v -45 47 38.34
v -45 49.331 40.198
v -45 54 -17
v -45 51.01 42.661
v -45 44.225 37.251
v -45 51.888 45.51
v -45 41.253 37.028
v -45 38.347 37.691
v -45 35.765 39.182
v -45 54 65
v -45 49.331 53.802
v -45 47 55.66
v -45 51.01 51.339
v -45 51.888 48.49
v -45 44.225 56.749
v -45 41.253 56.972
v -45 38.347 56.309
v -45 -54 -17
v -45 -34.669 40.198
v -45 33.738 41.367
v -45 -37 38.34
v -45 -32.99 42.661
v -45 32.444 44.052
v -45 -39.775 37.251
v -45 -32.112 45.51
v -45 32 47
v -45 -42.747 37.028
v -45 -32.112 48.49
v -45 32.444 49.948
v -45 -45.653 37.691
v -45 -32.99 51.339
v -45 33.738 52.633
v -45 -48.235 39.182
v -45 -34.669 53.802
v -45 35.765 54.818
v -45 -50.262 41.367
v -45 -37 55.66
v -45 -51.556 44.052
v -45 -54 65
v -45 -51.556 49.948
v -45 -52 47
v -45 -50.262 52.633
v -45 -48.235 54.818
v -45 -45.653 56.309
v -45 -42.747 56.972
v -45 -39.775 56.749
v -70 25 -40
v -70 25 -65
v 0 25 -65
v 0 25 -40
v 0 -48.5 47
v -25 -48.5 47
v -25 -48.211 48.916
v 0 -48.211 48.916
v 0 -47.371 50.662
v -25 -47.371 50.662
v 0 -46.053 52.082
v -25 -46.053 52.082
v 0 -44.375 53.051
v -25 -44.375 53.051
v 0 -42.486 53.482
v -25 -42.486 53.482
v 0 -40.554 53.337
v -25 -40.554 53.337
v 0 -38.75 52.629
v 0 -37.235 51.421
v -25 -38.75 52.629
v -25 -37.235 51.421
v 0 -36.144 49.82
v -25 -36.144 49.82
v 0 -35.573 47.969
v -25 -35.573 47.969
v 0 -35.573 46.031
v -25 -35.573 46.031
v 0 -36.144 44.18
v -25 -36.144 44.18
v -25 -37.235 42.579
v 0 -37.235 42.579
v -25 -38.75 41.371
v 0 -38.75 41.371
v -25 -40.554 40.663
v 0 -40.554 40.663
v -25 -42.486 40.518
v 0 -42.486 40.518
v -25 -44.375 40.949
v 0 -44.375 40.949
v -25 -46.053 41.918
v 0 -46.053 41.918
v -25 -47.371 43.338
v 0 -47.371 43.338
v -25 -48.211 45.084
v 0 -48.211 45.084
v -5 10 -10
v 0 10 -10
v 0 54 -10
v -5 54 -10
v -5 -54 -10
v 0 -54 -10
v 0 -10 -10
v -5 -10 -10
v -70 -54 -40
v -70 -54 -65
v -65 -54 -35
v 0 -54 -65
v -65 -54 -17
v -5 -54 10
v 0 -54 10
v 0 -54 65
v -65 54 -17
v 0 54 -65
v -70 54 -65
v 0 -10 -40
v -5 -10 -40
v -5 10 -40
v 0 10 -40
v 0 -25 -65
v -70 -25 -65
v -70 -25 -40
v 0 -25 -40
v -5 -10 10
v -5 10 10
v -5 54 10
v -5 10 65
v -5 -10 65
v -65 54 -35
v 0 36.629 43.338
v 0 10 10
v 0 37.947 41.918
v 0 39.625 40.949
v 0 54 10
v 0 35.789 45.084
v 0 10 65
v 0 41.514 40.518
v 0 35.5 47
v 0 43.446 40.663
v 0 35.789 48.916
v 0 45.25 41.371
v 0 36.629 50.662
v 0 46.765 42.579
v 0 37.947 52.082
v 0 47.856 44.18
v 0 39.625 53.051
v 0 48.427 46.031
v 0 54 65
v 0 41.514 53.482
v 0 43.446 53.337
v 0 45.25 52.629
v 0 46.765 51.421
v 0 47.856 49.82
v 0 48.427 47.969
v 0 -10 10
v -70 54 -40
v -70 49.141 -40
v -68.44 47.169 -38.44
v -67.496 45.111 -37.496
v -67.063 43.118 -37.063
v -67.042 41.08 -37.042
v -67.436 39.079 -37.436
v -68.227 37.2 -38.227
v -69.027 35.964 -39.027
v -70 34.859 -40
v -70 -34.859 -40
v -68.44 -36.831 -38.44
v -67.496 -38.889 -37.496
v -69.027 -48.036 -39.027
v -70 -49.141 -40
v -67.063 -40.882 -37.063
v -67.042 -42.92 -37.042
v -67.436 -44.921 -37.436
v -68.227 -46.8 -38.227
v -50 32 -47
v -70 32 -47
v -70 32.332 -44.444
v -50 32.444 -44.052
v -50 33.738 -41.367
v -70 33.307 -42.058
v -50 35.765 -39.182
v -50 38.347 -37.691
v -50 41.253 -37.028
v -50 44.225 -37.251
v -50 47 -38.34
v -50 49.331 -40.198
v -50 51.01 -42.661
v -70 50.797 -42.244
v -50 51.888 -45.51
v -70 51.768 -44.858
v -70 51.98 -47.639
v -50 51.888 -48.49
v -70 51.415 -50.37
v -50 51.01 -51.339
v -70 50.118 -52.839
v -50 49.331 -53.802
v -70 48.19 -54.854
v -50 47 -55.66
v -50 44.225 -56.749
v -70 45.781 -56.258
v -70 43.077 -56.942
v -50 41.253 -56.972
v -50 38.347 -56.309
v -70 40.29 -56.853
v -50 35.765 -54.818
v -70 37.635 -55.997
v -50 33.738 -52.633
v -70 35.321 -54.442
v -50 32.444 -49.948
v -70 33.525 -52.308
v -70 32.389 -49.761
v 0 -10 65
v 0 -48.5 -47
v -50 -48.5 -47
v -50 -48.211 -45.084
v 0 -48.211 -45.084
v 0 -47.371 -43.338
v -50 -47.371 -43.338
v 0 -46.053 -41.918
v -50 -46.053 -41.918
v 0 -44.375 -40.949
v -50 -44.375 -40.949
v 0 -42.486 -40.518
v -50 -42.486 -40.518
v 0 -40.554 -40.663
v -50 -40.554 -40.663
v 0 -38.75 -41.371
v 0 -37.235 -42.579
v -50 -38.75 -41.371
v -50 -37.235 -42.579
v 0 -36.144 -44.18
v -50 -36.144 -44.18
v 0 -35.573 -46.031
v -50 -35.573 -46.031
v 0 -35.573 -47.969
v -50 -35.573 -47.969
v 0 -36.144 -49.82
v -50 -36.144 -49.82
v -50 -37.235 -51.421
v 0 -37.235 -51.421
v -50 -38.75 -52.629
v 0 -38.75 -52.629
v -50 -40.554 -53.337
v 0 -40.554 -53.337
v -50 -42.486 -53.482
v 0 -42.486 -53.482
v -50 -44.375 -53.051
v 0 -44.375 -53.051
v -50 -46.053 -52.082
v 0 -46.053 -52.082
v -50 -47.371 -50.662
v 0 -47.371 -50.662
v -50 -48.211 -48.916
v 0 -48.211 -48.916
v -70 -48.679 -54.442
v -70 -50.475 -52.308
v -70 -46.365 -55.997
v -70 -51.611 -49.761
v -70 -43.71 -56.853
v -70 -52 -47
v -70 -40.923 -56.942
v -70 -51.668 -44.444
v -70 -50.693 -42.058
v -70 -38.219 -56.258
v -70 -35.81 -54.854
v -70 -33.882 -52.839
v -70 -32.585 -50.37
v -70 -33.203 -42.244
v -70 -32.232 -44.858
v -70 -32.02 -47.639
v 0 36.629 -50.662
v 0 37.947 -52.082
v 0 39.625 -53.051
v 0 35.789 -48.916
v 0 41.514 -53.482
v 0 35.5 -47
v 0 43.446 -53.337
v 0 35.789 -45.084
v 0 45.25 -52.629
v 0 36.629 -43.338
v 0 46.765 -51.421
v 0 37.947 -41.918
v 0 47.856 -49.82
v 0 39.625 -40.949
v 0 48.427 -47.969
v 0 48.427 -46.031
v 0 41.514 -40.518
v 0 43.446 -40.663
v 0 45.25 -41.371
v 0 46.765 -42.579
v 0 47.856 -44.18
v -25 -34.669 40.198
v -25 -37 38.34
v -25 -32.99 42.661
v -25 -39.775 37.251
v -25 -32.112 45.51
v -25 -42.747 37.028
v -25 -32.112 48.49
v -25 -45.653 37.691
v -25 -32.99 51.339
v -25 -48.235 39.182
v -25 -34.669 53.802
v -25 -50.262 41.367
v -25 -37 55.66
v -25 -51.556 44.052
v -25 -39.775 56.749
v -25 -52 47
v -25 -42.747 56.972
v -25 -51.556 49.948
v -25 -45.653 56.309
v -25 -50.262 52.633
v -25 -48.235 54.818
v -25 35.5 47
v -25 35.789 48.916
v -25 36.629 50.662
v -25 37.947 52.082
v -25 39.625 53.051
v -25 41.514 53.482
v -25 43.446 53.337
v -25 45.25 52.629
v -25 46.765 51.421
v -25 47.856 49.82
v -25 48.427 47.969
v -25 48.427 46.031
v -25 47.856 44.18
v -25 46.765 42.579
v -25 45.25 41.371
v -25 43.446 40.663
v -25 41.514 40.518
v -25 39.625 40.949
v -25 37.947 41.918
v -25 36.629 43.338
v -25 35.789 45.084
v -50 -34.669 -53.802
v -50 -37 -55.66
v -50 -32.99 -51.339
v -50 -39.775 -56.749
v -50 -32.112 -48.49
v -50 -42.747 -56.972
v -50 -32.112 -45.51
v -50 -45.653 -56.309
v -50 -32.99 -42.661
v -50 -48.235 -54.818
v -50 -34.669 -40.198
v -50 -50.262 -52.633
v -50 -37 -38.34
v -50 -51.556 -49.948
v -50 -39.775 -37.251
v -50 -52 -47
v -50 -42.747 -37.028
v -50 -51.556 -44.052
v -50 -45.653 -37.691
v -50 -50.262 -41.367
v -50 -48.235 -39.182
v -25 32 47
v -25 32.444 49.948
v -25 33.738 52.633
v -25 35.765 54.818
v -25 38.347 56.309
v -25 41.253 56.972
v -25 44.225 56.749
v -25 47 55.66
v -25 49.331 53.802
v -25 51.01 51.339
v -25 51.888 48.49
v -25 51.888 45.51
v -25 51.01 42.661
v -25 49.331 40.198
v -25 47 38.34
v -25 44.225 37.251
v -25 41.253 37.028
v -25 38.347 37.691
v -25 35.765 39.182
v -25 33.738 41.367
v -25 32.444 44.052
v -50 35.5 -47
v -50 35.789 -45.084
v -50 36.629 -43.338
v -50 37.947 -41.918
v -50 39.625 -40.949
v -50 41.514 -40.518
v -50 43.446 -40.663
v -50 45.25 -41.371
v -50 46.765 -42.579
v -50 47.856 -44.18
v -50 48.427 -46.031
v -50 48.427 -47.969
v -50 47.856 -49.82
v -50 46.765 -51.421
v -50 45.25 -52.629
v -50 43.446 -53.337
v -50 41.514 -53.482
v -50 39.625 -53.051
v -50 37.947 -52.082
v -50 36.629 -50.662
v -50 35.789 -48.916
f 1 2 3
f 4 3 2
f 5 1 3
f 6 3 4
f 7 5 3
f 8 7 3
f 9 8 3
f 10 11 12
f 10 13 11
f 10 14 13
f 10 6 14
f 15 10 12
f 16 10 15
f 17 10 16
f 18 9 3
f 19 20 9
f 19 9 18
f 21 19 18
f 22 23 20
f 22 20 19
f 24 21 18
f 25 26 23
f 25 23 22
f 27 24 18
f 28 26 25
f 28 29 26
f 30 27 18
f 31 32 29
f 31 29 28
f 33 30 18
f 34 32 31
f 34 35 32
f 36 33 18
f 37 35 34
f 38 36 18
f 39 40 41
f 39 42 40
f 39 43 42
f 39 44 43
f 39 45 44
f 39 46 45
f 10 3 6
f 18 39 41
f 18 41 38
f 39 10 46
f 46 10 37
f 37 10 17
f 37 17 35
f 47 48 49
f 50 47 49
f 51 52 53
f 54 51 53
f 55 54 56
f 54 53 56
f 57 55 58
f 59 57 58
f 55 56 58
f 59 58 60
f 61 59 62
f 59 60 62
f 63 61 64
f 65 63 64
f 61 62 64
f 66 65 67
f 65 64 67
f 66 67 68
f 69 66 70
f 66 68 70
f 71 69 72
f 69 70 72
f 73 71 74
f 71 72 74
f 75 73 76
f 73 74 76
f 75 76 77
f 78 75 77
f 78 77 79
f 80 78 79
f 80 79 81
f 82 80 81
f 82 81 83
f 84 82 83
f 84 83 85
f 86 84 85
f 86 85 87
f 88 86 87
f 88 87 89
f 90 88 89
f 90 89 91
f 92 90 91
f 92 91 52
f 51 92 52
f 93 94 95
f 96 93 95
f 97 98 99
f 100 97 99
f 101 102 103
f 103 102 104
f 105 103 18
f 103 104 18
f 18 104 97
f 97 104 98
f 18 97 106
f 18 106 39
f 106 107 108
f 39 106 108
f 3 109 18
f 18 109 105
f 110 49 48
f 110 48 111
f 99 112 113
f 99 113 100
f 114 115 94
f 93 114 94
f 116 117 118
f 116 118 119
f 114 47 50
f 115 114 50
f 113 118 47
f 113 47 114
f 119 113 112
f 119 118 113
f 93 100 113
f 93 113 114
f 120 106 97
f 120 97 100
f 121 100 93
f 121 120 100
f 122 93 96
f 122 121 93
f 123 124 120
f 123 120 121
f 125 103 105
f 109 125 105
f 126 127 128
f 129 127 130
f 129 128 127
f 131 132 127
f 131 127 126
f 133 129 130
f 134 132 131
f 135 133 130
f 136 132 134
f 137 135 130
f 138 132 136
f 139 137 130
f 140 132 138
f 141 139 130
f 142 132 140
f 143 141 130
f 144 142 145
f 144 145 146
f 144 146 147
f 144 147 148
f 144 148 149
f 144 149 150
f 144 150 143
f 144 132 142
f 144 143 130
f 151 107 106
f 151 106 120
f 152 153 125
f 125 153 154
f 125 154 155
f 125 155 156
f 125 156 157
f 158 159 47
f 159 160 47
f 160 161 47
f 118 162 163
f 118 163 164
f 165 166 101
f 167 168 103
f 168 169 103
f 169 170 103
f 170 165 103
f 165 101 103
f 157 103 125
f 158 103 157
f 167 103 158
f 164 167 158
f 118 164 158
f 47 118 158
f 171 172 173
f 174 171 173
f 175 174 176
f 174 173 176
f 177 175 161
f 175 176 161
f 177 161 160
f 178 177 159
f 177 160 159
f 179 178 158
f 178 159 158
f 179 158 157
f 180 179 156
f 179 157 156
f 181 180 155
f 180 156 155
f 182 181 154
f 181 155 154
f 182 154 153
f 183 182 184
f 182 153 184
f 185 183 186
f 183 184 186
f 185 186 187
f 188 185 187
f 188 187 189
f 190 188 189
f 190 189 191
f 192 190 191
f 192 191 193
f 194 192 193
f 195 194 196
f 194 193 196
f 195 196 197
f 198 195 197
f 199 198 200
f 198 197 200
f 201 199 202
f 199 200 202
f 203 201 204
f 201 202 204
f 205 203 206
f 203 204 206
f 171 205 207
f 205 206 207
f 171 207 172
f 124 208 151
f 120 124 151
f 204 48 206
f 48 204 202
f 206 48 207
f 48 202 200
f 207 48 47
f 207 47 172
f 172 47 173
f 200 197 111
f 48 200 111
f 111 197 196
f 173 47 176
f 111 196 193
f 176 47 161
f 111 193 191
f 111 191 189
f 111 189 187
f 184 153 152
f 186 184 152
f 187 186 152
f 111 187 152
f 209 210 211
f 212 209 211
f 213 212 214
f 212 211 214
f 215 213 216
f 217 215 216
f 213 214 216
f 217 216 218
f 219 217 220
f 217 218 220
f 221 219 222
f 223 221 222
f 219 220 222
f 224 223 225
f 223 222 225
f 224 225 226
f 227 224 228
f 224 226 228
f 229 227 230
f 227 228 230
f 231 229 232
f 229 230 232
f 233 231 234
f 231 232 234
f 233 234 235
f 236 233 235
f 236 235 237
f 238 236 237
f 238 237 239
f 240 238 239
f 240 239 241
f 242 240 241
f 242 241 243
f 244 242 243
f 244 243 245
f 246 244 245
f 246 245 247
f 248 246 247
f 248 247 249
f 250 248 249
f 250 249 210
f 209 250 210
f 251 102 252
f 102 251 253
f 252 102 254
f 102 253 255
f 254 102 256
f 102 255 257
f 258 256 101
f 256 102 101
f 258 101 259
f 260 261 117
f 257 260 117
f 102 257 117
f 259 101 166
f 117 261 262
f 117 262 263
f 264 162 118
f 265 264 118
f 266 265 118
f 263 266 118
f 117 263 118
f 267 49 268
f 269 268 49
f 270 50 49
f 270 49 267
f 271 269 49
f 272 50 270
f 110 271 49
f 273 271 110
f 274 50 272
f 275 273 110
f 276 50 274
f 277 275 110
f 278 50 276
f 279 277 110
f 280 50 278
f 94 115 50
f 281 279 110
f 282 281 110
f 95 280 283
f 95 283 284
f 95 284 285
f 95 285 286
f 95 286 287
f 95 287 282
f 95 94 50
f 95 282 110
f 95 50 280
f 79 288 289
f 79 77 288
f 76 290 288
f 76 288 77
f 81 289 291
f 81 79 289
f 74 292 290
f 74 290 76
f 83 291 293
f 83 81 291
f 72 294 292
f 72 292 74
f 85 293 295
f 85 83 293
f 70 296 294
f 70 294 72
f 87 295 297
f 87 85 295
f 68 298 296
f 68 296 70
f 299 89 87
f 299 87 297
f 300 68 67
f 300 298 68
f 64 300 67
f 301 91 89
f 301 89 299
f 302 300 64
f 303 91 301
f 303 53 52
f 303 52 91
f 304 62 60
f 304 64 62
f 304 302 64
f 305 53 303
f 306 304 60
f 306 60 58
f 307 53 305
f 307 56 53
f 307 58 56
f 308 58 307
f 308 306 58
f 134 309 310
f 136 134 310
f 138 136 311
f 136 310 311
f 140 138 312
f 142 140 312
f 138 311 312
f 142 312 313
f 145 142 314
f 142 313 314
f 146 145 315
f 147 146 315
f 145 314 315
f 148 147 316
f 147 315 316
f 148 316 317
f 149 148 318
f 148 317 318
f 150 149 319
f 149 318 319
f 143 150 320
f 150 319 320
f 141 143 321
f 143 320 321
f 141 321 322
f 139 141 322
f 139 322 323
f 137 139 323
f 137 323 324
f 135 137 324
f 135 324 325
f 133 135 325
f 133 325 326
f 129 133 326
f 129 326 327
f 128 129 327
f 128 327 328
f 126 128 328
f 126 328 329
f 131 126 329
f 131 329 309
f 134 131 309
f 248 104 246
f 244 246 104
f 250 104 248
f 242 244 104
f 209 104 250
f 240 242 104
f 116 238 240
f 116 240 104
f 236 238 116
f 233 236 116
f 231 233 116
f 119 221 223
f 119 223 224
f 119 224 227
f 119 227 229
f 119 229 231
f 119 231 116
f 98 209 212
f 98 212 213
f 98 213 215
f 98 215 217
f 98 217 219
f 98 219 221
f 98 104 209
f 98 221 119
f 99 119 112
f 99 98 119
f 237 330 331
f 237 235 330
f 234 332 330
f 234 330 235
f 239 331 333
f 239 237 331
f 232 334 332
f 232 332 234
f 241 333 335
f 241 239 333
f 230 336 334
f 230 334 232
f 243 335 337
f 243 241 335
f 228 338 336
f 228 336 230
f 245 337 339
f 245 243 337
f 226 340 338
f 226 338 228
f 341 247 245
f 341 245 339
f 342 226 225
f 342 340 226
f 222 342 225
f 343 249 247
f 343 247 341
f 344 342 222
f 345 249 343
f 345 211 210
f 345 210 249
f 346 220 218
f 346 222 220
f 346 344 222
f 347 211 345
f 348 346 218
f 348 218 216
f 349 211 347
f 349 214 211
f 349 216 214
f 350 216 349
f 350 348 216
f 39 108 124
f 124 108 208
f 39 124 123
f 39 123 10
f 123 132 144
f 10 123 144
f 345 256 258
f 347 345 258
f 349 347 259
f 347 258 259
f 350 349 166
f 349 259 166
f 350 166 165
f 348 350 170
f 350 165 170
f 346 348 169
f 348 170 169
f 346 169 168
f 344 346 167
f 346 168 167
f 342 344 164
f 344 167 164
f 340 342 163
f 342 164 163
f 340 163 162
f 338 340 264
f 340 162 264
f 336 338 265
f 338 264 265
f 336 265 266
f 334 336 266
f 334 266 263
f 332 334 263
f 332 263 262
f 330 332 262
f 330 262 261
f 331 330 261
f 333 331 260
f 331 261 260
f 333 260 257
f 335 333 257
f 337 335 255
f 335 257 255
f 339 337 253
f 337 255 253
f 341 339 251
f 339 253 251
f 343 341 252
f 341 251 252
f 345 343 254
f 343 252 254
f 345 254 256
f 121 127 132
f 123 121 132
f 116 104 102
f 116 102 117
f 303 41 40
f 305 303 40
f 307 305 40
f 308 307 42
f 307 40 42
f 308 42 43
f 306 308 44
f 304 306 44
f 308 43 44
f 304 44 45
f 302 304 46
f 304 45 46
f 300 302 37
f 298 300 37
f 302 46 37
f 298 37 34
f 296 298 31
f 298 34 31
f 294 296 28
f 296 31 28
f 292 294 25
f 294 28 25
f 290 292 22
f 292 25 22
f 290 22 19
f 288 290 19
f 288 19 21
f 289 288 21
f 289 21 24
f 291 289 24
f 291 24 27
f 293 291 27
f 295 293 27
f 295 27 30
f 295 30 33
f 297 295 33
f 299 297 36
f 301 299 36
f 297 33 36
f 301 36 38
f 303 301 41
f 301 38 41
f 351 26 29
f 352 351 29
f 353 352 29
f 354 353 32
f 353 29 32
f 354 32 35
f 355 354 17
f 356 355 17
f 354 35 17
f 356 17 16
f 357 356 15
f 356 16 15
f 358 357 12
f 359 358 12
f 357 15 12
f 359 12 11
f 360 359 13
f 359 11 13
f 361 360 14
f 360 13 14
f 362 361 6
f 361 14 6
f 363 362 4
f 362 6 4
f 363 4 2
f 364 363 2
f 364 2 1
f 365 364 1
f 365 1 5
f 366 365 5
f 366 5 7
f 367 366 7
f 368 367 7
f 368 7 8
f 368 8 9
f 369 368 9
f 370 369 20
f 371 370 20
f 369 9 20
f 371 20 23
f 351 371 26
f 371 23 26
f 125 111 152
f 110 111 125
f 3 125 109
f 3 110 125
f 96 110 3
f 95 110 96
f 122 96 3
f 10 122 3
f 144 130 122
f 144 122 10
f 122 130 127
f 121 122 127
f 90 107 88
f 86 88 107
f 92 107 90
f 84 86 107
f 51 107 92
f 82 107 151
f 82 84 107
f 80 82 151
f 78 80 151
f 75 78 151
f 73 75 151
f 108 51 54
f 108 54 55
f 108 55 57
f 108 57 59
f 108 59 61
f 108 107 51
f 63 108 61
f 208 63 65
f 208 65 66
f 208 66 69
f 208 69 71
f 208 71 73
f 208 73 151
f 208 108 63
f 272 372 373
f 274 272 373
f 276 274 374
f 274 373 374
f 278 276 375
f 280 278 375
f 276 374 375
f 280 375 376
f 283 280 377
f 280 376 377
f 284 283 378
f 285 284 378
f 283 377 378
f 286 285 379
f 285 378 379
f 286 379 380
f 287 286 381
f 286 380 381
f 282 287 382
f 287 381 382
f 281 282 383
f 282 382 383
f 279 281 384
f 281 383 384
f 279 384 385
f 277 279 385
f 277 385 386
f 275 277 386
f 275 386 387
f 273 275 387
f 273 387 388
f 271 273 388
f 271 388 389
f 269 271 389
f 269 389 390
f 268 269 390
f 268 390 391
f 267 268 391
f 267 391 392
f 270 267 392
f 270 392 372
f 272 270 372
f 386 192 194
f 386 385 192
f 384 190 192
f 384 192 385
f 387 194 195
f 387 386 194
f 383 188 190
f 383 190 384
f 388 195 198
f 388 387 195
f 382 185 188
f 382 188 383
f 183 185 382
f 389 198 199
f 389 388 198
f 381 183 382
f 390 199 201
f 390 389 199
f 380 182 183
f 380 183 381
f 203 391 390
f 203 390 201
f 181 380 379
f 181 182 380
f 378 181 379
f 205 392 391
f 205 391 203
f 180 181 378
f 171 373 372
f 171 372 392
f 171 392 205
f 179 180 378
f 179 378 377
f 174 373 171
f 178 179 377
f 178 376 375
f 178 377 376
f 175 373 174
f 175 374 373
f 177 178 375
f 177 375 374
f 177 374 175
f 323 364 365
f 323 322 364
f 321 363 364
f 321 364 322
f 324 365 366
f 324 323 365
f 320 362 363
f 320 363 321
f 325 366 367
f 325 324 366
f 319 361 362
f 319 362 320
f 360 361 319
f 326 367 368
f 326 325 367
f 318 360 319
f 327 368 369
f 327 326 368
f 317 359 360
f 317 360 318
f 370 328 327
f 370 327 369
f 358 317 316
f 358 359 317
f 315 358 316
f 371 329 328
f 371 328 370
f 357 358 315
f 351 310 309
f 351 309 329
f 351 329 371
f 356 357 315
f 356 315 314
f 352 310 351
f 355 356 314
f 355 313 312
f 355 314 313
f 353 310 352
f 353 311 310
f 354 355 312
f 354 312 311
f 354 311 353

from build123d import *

# Parameters (mm, degrees)
F0_W      = 108
F0_H      = 130
F1_DEPTH  = 70
F2_R      = 6.5
F3_DEPTH  = 70.001
F4_W      = 70
F4_H      = 50
F5_DEPTH  = 25
F6_W      = 108
F6_H      = 82
F7_DEPTH  = 25
F9_DEPTH  = 108.001
F10_R     = 10
F11_DEPTH = 20
F12_R     = 10
F13_DEPTH = 20
F14_W     = 44
F14_H     = 20
F14_W_2   = 20
F14_H_2   = 55
F15_DEPTH = 5


with BuildPart() as f1:
    # F0 (on Right) → F1 (new body)
    with BuildSketch(Plane.YZ):
        Rectangle(F0_W, F0_H)
    extrude(amount=-F1_DEPTH)

    # F2 (on face) → F3 (cut, through all)
    with BuildSketch(Plane(origin=(-70, 0, 0), x_dir=(0, -1, 0), z_dir=(-1, 0, 0))):
        with Locations((-42, 47)):
            Circle(F2_R)
        with Locations((42, 47)):
            Circle(F2_R)
        with Locations((-42, -47)):
            Circle(F2_R)
        with Locations((42, -47)):
            Circle(F2_R)
    extrude(amount=-F3_DEPTH, mode=Mode.SUBTRACT)

    # F4 (on face) → F5 (cut)
    with BuildSketch(Plane(origin=(0, 0, -65), x_dir=(1, 0, 0), z_dir=(0, 0, -1))):
        with Locations((-35, 0)):
            Rectangle(F4_W, F4_H)
    extrude(amount=-F5_DEPTH, mode=Mode.SUBTRACT)

    # F6 (on face) → F7 (cut)
    with BuildSketch(Plane(origin=(-70, 0, 0), x_dir=(0, -1, 0), z_dir=(-1, 0, 0))):
        with Locations((0, 24)):
            Rectangle(F6_W, F6_H)
    extrude(amount=-F7_DEPTH, mode=Mode.SUBTRACT)

    # F8 (on face) → F9 (cut, through all)
    with BuildSketch(Plane.XZ.offset(54)):
        Polygon((-65, -35), (-65, -17), (-70, -17), (-70, -40), align=None)
    extrude(amount=-F9_DEPTH, mode=Mode.SUBTRACT)

    # F10 (on face) → F11 (cut)
    with BuildSketch(Plane(origin=(-70, 0, 0), x_dir=(0, -1, 0), z_dir=(-1, 0, 0))):
        with Locations((-42, -47)):
            Circle(F10_R)
        with Locations((42, -47)):
            Circle(F10_R)
    extrude(amount=-F11_DEPTH, mode=Mode.SUBTRACT)

    # F12 (on face) → F13 (cut)
    with BuildSketch(Plane(origin=(-45, 0, 0), x_dir=(0, -1, 0), z_dir=(-1, 0, 0))):
        with Locations((-42, 47)):
            Circle(F12_R)
        with Locations((42, 47)):
            Circle(F12_R)
    extrude(amount=-F13_DEPTH, mode=Mode.SUBTRACT)

    # F14 (on face) → F15 (cut)
    with BuildSketch(Plane.YZ):
        with Locations((32, 0)):
            Rectangle(F14_W, F14_H)
        Rectangle(F14_W_2, F14_H)
        with Locations((0, 37.5)):
            Rectangle(F14_W_2, F14_H_2)
        with Locations((-32, 0)):
            Rectangle(F14_W, F14_H)
        with Locations((0, -37.5)):
            Rectangle(F14_W_2, F14_H_2)
    extrude(amount=-F15_DEPTH, mode=Mode.SUBTRACT)


solid = f1.part
